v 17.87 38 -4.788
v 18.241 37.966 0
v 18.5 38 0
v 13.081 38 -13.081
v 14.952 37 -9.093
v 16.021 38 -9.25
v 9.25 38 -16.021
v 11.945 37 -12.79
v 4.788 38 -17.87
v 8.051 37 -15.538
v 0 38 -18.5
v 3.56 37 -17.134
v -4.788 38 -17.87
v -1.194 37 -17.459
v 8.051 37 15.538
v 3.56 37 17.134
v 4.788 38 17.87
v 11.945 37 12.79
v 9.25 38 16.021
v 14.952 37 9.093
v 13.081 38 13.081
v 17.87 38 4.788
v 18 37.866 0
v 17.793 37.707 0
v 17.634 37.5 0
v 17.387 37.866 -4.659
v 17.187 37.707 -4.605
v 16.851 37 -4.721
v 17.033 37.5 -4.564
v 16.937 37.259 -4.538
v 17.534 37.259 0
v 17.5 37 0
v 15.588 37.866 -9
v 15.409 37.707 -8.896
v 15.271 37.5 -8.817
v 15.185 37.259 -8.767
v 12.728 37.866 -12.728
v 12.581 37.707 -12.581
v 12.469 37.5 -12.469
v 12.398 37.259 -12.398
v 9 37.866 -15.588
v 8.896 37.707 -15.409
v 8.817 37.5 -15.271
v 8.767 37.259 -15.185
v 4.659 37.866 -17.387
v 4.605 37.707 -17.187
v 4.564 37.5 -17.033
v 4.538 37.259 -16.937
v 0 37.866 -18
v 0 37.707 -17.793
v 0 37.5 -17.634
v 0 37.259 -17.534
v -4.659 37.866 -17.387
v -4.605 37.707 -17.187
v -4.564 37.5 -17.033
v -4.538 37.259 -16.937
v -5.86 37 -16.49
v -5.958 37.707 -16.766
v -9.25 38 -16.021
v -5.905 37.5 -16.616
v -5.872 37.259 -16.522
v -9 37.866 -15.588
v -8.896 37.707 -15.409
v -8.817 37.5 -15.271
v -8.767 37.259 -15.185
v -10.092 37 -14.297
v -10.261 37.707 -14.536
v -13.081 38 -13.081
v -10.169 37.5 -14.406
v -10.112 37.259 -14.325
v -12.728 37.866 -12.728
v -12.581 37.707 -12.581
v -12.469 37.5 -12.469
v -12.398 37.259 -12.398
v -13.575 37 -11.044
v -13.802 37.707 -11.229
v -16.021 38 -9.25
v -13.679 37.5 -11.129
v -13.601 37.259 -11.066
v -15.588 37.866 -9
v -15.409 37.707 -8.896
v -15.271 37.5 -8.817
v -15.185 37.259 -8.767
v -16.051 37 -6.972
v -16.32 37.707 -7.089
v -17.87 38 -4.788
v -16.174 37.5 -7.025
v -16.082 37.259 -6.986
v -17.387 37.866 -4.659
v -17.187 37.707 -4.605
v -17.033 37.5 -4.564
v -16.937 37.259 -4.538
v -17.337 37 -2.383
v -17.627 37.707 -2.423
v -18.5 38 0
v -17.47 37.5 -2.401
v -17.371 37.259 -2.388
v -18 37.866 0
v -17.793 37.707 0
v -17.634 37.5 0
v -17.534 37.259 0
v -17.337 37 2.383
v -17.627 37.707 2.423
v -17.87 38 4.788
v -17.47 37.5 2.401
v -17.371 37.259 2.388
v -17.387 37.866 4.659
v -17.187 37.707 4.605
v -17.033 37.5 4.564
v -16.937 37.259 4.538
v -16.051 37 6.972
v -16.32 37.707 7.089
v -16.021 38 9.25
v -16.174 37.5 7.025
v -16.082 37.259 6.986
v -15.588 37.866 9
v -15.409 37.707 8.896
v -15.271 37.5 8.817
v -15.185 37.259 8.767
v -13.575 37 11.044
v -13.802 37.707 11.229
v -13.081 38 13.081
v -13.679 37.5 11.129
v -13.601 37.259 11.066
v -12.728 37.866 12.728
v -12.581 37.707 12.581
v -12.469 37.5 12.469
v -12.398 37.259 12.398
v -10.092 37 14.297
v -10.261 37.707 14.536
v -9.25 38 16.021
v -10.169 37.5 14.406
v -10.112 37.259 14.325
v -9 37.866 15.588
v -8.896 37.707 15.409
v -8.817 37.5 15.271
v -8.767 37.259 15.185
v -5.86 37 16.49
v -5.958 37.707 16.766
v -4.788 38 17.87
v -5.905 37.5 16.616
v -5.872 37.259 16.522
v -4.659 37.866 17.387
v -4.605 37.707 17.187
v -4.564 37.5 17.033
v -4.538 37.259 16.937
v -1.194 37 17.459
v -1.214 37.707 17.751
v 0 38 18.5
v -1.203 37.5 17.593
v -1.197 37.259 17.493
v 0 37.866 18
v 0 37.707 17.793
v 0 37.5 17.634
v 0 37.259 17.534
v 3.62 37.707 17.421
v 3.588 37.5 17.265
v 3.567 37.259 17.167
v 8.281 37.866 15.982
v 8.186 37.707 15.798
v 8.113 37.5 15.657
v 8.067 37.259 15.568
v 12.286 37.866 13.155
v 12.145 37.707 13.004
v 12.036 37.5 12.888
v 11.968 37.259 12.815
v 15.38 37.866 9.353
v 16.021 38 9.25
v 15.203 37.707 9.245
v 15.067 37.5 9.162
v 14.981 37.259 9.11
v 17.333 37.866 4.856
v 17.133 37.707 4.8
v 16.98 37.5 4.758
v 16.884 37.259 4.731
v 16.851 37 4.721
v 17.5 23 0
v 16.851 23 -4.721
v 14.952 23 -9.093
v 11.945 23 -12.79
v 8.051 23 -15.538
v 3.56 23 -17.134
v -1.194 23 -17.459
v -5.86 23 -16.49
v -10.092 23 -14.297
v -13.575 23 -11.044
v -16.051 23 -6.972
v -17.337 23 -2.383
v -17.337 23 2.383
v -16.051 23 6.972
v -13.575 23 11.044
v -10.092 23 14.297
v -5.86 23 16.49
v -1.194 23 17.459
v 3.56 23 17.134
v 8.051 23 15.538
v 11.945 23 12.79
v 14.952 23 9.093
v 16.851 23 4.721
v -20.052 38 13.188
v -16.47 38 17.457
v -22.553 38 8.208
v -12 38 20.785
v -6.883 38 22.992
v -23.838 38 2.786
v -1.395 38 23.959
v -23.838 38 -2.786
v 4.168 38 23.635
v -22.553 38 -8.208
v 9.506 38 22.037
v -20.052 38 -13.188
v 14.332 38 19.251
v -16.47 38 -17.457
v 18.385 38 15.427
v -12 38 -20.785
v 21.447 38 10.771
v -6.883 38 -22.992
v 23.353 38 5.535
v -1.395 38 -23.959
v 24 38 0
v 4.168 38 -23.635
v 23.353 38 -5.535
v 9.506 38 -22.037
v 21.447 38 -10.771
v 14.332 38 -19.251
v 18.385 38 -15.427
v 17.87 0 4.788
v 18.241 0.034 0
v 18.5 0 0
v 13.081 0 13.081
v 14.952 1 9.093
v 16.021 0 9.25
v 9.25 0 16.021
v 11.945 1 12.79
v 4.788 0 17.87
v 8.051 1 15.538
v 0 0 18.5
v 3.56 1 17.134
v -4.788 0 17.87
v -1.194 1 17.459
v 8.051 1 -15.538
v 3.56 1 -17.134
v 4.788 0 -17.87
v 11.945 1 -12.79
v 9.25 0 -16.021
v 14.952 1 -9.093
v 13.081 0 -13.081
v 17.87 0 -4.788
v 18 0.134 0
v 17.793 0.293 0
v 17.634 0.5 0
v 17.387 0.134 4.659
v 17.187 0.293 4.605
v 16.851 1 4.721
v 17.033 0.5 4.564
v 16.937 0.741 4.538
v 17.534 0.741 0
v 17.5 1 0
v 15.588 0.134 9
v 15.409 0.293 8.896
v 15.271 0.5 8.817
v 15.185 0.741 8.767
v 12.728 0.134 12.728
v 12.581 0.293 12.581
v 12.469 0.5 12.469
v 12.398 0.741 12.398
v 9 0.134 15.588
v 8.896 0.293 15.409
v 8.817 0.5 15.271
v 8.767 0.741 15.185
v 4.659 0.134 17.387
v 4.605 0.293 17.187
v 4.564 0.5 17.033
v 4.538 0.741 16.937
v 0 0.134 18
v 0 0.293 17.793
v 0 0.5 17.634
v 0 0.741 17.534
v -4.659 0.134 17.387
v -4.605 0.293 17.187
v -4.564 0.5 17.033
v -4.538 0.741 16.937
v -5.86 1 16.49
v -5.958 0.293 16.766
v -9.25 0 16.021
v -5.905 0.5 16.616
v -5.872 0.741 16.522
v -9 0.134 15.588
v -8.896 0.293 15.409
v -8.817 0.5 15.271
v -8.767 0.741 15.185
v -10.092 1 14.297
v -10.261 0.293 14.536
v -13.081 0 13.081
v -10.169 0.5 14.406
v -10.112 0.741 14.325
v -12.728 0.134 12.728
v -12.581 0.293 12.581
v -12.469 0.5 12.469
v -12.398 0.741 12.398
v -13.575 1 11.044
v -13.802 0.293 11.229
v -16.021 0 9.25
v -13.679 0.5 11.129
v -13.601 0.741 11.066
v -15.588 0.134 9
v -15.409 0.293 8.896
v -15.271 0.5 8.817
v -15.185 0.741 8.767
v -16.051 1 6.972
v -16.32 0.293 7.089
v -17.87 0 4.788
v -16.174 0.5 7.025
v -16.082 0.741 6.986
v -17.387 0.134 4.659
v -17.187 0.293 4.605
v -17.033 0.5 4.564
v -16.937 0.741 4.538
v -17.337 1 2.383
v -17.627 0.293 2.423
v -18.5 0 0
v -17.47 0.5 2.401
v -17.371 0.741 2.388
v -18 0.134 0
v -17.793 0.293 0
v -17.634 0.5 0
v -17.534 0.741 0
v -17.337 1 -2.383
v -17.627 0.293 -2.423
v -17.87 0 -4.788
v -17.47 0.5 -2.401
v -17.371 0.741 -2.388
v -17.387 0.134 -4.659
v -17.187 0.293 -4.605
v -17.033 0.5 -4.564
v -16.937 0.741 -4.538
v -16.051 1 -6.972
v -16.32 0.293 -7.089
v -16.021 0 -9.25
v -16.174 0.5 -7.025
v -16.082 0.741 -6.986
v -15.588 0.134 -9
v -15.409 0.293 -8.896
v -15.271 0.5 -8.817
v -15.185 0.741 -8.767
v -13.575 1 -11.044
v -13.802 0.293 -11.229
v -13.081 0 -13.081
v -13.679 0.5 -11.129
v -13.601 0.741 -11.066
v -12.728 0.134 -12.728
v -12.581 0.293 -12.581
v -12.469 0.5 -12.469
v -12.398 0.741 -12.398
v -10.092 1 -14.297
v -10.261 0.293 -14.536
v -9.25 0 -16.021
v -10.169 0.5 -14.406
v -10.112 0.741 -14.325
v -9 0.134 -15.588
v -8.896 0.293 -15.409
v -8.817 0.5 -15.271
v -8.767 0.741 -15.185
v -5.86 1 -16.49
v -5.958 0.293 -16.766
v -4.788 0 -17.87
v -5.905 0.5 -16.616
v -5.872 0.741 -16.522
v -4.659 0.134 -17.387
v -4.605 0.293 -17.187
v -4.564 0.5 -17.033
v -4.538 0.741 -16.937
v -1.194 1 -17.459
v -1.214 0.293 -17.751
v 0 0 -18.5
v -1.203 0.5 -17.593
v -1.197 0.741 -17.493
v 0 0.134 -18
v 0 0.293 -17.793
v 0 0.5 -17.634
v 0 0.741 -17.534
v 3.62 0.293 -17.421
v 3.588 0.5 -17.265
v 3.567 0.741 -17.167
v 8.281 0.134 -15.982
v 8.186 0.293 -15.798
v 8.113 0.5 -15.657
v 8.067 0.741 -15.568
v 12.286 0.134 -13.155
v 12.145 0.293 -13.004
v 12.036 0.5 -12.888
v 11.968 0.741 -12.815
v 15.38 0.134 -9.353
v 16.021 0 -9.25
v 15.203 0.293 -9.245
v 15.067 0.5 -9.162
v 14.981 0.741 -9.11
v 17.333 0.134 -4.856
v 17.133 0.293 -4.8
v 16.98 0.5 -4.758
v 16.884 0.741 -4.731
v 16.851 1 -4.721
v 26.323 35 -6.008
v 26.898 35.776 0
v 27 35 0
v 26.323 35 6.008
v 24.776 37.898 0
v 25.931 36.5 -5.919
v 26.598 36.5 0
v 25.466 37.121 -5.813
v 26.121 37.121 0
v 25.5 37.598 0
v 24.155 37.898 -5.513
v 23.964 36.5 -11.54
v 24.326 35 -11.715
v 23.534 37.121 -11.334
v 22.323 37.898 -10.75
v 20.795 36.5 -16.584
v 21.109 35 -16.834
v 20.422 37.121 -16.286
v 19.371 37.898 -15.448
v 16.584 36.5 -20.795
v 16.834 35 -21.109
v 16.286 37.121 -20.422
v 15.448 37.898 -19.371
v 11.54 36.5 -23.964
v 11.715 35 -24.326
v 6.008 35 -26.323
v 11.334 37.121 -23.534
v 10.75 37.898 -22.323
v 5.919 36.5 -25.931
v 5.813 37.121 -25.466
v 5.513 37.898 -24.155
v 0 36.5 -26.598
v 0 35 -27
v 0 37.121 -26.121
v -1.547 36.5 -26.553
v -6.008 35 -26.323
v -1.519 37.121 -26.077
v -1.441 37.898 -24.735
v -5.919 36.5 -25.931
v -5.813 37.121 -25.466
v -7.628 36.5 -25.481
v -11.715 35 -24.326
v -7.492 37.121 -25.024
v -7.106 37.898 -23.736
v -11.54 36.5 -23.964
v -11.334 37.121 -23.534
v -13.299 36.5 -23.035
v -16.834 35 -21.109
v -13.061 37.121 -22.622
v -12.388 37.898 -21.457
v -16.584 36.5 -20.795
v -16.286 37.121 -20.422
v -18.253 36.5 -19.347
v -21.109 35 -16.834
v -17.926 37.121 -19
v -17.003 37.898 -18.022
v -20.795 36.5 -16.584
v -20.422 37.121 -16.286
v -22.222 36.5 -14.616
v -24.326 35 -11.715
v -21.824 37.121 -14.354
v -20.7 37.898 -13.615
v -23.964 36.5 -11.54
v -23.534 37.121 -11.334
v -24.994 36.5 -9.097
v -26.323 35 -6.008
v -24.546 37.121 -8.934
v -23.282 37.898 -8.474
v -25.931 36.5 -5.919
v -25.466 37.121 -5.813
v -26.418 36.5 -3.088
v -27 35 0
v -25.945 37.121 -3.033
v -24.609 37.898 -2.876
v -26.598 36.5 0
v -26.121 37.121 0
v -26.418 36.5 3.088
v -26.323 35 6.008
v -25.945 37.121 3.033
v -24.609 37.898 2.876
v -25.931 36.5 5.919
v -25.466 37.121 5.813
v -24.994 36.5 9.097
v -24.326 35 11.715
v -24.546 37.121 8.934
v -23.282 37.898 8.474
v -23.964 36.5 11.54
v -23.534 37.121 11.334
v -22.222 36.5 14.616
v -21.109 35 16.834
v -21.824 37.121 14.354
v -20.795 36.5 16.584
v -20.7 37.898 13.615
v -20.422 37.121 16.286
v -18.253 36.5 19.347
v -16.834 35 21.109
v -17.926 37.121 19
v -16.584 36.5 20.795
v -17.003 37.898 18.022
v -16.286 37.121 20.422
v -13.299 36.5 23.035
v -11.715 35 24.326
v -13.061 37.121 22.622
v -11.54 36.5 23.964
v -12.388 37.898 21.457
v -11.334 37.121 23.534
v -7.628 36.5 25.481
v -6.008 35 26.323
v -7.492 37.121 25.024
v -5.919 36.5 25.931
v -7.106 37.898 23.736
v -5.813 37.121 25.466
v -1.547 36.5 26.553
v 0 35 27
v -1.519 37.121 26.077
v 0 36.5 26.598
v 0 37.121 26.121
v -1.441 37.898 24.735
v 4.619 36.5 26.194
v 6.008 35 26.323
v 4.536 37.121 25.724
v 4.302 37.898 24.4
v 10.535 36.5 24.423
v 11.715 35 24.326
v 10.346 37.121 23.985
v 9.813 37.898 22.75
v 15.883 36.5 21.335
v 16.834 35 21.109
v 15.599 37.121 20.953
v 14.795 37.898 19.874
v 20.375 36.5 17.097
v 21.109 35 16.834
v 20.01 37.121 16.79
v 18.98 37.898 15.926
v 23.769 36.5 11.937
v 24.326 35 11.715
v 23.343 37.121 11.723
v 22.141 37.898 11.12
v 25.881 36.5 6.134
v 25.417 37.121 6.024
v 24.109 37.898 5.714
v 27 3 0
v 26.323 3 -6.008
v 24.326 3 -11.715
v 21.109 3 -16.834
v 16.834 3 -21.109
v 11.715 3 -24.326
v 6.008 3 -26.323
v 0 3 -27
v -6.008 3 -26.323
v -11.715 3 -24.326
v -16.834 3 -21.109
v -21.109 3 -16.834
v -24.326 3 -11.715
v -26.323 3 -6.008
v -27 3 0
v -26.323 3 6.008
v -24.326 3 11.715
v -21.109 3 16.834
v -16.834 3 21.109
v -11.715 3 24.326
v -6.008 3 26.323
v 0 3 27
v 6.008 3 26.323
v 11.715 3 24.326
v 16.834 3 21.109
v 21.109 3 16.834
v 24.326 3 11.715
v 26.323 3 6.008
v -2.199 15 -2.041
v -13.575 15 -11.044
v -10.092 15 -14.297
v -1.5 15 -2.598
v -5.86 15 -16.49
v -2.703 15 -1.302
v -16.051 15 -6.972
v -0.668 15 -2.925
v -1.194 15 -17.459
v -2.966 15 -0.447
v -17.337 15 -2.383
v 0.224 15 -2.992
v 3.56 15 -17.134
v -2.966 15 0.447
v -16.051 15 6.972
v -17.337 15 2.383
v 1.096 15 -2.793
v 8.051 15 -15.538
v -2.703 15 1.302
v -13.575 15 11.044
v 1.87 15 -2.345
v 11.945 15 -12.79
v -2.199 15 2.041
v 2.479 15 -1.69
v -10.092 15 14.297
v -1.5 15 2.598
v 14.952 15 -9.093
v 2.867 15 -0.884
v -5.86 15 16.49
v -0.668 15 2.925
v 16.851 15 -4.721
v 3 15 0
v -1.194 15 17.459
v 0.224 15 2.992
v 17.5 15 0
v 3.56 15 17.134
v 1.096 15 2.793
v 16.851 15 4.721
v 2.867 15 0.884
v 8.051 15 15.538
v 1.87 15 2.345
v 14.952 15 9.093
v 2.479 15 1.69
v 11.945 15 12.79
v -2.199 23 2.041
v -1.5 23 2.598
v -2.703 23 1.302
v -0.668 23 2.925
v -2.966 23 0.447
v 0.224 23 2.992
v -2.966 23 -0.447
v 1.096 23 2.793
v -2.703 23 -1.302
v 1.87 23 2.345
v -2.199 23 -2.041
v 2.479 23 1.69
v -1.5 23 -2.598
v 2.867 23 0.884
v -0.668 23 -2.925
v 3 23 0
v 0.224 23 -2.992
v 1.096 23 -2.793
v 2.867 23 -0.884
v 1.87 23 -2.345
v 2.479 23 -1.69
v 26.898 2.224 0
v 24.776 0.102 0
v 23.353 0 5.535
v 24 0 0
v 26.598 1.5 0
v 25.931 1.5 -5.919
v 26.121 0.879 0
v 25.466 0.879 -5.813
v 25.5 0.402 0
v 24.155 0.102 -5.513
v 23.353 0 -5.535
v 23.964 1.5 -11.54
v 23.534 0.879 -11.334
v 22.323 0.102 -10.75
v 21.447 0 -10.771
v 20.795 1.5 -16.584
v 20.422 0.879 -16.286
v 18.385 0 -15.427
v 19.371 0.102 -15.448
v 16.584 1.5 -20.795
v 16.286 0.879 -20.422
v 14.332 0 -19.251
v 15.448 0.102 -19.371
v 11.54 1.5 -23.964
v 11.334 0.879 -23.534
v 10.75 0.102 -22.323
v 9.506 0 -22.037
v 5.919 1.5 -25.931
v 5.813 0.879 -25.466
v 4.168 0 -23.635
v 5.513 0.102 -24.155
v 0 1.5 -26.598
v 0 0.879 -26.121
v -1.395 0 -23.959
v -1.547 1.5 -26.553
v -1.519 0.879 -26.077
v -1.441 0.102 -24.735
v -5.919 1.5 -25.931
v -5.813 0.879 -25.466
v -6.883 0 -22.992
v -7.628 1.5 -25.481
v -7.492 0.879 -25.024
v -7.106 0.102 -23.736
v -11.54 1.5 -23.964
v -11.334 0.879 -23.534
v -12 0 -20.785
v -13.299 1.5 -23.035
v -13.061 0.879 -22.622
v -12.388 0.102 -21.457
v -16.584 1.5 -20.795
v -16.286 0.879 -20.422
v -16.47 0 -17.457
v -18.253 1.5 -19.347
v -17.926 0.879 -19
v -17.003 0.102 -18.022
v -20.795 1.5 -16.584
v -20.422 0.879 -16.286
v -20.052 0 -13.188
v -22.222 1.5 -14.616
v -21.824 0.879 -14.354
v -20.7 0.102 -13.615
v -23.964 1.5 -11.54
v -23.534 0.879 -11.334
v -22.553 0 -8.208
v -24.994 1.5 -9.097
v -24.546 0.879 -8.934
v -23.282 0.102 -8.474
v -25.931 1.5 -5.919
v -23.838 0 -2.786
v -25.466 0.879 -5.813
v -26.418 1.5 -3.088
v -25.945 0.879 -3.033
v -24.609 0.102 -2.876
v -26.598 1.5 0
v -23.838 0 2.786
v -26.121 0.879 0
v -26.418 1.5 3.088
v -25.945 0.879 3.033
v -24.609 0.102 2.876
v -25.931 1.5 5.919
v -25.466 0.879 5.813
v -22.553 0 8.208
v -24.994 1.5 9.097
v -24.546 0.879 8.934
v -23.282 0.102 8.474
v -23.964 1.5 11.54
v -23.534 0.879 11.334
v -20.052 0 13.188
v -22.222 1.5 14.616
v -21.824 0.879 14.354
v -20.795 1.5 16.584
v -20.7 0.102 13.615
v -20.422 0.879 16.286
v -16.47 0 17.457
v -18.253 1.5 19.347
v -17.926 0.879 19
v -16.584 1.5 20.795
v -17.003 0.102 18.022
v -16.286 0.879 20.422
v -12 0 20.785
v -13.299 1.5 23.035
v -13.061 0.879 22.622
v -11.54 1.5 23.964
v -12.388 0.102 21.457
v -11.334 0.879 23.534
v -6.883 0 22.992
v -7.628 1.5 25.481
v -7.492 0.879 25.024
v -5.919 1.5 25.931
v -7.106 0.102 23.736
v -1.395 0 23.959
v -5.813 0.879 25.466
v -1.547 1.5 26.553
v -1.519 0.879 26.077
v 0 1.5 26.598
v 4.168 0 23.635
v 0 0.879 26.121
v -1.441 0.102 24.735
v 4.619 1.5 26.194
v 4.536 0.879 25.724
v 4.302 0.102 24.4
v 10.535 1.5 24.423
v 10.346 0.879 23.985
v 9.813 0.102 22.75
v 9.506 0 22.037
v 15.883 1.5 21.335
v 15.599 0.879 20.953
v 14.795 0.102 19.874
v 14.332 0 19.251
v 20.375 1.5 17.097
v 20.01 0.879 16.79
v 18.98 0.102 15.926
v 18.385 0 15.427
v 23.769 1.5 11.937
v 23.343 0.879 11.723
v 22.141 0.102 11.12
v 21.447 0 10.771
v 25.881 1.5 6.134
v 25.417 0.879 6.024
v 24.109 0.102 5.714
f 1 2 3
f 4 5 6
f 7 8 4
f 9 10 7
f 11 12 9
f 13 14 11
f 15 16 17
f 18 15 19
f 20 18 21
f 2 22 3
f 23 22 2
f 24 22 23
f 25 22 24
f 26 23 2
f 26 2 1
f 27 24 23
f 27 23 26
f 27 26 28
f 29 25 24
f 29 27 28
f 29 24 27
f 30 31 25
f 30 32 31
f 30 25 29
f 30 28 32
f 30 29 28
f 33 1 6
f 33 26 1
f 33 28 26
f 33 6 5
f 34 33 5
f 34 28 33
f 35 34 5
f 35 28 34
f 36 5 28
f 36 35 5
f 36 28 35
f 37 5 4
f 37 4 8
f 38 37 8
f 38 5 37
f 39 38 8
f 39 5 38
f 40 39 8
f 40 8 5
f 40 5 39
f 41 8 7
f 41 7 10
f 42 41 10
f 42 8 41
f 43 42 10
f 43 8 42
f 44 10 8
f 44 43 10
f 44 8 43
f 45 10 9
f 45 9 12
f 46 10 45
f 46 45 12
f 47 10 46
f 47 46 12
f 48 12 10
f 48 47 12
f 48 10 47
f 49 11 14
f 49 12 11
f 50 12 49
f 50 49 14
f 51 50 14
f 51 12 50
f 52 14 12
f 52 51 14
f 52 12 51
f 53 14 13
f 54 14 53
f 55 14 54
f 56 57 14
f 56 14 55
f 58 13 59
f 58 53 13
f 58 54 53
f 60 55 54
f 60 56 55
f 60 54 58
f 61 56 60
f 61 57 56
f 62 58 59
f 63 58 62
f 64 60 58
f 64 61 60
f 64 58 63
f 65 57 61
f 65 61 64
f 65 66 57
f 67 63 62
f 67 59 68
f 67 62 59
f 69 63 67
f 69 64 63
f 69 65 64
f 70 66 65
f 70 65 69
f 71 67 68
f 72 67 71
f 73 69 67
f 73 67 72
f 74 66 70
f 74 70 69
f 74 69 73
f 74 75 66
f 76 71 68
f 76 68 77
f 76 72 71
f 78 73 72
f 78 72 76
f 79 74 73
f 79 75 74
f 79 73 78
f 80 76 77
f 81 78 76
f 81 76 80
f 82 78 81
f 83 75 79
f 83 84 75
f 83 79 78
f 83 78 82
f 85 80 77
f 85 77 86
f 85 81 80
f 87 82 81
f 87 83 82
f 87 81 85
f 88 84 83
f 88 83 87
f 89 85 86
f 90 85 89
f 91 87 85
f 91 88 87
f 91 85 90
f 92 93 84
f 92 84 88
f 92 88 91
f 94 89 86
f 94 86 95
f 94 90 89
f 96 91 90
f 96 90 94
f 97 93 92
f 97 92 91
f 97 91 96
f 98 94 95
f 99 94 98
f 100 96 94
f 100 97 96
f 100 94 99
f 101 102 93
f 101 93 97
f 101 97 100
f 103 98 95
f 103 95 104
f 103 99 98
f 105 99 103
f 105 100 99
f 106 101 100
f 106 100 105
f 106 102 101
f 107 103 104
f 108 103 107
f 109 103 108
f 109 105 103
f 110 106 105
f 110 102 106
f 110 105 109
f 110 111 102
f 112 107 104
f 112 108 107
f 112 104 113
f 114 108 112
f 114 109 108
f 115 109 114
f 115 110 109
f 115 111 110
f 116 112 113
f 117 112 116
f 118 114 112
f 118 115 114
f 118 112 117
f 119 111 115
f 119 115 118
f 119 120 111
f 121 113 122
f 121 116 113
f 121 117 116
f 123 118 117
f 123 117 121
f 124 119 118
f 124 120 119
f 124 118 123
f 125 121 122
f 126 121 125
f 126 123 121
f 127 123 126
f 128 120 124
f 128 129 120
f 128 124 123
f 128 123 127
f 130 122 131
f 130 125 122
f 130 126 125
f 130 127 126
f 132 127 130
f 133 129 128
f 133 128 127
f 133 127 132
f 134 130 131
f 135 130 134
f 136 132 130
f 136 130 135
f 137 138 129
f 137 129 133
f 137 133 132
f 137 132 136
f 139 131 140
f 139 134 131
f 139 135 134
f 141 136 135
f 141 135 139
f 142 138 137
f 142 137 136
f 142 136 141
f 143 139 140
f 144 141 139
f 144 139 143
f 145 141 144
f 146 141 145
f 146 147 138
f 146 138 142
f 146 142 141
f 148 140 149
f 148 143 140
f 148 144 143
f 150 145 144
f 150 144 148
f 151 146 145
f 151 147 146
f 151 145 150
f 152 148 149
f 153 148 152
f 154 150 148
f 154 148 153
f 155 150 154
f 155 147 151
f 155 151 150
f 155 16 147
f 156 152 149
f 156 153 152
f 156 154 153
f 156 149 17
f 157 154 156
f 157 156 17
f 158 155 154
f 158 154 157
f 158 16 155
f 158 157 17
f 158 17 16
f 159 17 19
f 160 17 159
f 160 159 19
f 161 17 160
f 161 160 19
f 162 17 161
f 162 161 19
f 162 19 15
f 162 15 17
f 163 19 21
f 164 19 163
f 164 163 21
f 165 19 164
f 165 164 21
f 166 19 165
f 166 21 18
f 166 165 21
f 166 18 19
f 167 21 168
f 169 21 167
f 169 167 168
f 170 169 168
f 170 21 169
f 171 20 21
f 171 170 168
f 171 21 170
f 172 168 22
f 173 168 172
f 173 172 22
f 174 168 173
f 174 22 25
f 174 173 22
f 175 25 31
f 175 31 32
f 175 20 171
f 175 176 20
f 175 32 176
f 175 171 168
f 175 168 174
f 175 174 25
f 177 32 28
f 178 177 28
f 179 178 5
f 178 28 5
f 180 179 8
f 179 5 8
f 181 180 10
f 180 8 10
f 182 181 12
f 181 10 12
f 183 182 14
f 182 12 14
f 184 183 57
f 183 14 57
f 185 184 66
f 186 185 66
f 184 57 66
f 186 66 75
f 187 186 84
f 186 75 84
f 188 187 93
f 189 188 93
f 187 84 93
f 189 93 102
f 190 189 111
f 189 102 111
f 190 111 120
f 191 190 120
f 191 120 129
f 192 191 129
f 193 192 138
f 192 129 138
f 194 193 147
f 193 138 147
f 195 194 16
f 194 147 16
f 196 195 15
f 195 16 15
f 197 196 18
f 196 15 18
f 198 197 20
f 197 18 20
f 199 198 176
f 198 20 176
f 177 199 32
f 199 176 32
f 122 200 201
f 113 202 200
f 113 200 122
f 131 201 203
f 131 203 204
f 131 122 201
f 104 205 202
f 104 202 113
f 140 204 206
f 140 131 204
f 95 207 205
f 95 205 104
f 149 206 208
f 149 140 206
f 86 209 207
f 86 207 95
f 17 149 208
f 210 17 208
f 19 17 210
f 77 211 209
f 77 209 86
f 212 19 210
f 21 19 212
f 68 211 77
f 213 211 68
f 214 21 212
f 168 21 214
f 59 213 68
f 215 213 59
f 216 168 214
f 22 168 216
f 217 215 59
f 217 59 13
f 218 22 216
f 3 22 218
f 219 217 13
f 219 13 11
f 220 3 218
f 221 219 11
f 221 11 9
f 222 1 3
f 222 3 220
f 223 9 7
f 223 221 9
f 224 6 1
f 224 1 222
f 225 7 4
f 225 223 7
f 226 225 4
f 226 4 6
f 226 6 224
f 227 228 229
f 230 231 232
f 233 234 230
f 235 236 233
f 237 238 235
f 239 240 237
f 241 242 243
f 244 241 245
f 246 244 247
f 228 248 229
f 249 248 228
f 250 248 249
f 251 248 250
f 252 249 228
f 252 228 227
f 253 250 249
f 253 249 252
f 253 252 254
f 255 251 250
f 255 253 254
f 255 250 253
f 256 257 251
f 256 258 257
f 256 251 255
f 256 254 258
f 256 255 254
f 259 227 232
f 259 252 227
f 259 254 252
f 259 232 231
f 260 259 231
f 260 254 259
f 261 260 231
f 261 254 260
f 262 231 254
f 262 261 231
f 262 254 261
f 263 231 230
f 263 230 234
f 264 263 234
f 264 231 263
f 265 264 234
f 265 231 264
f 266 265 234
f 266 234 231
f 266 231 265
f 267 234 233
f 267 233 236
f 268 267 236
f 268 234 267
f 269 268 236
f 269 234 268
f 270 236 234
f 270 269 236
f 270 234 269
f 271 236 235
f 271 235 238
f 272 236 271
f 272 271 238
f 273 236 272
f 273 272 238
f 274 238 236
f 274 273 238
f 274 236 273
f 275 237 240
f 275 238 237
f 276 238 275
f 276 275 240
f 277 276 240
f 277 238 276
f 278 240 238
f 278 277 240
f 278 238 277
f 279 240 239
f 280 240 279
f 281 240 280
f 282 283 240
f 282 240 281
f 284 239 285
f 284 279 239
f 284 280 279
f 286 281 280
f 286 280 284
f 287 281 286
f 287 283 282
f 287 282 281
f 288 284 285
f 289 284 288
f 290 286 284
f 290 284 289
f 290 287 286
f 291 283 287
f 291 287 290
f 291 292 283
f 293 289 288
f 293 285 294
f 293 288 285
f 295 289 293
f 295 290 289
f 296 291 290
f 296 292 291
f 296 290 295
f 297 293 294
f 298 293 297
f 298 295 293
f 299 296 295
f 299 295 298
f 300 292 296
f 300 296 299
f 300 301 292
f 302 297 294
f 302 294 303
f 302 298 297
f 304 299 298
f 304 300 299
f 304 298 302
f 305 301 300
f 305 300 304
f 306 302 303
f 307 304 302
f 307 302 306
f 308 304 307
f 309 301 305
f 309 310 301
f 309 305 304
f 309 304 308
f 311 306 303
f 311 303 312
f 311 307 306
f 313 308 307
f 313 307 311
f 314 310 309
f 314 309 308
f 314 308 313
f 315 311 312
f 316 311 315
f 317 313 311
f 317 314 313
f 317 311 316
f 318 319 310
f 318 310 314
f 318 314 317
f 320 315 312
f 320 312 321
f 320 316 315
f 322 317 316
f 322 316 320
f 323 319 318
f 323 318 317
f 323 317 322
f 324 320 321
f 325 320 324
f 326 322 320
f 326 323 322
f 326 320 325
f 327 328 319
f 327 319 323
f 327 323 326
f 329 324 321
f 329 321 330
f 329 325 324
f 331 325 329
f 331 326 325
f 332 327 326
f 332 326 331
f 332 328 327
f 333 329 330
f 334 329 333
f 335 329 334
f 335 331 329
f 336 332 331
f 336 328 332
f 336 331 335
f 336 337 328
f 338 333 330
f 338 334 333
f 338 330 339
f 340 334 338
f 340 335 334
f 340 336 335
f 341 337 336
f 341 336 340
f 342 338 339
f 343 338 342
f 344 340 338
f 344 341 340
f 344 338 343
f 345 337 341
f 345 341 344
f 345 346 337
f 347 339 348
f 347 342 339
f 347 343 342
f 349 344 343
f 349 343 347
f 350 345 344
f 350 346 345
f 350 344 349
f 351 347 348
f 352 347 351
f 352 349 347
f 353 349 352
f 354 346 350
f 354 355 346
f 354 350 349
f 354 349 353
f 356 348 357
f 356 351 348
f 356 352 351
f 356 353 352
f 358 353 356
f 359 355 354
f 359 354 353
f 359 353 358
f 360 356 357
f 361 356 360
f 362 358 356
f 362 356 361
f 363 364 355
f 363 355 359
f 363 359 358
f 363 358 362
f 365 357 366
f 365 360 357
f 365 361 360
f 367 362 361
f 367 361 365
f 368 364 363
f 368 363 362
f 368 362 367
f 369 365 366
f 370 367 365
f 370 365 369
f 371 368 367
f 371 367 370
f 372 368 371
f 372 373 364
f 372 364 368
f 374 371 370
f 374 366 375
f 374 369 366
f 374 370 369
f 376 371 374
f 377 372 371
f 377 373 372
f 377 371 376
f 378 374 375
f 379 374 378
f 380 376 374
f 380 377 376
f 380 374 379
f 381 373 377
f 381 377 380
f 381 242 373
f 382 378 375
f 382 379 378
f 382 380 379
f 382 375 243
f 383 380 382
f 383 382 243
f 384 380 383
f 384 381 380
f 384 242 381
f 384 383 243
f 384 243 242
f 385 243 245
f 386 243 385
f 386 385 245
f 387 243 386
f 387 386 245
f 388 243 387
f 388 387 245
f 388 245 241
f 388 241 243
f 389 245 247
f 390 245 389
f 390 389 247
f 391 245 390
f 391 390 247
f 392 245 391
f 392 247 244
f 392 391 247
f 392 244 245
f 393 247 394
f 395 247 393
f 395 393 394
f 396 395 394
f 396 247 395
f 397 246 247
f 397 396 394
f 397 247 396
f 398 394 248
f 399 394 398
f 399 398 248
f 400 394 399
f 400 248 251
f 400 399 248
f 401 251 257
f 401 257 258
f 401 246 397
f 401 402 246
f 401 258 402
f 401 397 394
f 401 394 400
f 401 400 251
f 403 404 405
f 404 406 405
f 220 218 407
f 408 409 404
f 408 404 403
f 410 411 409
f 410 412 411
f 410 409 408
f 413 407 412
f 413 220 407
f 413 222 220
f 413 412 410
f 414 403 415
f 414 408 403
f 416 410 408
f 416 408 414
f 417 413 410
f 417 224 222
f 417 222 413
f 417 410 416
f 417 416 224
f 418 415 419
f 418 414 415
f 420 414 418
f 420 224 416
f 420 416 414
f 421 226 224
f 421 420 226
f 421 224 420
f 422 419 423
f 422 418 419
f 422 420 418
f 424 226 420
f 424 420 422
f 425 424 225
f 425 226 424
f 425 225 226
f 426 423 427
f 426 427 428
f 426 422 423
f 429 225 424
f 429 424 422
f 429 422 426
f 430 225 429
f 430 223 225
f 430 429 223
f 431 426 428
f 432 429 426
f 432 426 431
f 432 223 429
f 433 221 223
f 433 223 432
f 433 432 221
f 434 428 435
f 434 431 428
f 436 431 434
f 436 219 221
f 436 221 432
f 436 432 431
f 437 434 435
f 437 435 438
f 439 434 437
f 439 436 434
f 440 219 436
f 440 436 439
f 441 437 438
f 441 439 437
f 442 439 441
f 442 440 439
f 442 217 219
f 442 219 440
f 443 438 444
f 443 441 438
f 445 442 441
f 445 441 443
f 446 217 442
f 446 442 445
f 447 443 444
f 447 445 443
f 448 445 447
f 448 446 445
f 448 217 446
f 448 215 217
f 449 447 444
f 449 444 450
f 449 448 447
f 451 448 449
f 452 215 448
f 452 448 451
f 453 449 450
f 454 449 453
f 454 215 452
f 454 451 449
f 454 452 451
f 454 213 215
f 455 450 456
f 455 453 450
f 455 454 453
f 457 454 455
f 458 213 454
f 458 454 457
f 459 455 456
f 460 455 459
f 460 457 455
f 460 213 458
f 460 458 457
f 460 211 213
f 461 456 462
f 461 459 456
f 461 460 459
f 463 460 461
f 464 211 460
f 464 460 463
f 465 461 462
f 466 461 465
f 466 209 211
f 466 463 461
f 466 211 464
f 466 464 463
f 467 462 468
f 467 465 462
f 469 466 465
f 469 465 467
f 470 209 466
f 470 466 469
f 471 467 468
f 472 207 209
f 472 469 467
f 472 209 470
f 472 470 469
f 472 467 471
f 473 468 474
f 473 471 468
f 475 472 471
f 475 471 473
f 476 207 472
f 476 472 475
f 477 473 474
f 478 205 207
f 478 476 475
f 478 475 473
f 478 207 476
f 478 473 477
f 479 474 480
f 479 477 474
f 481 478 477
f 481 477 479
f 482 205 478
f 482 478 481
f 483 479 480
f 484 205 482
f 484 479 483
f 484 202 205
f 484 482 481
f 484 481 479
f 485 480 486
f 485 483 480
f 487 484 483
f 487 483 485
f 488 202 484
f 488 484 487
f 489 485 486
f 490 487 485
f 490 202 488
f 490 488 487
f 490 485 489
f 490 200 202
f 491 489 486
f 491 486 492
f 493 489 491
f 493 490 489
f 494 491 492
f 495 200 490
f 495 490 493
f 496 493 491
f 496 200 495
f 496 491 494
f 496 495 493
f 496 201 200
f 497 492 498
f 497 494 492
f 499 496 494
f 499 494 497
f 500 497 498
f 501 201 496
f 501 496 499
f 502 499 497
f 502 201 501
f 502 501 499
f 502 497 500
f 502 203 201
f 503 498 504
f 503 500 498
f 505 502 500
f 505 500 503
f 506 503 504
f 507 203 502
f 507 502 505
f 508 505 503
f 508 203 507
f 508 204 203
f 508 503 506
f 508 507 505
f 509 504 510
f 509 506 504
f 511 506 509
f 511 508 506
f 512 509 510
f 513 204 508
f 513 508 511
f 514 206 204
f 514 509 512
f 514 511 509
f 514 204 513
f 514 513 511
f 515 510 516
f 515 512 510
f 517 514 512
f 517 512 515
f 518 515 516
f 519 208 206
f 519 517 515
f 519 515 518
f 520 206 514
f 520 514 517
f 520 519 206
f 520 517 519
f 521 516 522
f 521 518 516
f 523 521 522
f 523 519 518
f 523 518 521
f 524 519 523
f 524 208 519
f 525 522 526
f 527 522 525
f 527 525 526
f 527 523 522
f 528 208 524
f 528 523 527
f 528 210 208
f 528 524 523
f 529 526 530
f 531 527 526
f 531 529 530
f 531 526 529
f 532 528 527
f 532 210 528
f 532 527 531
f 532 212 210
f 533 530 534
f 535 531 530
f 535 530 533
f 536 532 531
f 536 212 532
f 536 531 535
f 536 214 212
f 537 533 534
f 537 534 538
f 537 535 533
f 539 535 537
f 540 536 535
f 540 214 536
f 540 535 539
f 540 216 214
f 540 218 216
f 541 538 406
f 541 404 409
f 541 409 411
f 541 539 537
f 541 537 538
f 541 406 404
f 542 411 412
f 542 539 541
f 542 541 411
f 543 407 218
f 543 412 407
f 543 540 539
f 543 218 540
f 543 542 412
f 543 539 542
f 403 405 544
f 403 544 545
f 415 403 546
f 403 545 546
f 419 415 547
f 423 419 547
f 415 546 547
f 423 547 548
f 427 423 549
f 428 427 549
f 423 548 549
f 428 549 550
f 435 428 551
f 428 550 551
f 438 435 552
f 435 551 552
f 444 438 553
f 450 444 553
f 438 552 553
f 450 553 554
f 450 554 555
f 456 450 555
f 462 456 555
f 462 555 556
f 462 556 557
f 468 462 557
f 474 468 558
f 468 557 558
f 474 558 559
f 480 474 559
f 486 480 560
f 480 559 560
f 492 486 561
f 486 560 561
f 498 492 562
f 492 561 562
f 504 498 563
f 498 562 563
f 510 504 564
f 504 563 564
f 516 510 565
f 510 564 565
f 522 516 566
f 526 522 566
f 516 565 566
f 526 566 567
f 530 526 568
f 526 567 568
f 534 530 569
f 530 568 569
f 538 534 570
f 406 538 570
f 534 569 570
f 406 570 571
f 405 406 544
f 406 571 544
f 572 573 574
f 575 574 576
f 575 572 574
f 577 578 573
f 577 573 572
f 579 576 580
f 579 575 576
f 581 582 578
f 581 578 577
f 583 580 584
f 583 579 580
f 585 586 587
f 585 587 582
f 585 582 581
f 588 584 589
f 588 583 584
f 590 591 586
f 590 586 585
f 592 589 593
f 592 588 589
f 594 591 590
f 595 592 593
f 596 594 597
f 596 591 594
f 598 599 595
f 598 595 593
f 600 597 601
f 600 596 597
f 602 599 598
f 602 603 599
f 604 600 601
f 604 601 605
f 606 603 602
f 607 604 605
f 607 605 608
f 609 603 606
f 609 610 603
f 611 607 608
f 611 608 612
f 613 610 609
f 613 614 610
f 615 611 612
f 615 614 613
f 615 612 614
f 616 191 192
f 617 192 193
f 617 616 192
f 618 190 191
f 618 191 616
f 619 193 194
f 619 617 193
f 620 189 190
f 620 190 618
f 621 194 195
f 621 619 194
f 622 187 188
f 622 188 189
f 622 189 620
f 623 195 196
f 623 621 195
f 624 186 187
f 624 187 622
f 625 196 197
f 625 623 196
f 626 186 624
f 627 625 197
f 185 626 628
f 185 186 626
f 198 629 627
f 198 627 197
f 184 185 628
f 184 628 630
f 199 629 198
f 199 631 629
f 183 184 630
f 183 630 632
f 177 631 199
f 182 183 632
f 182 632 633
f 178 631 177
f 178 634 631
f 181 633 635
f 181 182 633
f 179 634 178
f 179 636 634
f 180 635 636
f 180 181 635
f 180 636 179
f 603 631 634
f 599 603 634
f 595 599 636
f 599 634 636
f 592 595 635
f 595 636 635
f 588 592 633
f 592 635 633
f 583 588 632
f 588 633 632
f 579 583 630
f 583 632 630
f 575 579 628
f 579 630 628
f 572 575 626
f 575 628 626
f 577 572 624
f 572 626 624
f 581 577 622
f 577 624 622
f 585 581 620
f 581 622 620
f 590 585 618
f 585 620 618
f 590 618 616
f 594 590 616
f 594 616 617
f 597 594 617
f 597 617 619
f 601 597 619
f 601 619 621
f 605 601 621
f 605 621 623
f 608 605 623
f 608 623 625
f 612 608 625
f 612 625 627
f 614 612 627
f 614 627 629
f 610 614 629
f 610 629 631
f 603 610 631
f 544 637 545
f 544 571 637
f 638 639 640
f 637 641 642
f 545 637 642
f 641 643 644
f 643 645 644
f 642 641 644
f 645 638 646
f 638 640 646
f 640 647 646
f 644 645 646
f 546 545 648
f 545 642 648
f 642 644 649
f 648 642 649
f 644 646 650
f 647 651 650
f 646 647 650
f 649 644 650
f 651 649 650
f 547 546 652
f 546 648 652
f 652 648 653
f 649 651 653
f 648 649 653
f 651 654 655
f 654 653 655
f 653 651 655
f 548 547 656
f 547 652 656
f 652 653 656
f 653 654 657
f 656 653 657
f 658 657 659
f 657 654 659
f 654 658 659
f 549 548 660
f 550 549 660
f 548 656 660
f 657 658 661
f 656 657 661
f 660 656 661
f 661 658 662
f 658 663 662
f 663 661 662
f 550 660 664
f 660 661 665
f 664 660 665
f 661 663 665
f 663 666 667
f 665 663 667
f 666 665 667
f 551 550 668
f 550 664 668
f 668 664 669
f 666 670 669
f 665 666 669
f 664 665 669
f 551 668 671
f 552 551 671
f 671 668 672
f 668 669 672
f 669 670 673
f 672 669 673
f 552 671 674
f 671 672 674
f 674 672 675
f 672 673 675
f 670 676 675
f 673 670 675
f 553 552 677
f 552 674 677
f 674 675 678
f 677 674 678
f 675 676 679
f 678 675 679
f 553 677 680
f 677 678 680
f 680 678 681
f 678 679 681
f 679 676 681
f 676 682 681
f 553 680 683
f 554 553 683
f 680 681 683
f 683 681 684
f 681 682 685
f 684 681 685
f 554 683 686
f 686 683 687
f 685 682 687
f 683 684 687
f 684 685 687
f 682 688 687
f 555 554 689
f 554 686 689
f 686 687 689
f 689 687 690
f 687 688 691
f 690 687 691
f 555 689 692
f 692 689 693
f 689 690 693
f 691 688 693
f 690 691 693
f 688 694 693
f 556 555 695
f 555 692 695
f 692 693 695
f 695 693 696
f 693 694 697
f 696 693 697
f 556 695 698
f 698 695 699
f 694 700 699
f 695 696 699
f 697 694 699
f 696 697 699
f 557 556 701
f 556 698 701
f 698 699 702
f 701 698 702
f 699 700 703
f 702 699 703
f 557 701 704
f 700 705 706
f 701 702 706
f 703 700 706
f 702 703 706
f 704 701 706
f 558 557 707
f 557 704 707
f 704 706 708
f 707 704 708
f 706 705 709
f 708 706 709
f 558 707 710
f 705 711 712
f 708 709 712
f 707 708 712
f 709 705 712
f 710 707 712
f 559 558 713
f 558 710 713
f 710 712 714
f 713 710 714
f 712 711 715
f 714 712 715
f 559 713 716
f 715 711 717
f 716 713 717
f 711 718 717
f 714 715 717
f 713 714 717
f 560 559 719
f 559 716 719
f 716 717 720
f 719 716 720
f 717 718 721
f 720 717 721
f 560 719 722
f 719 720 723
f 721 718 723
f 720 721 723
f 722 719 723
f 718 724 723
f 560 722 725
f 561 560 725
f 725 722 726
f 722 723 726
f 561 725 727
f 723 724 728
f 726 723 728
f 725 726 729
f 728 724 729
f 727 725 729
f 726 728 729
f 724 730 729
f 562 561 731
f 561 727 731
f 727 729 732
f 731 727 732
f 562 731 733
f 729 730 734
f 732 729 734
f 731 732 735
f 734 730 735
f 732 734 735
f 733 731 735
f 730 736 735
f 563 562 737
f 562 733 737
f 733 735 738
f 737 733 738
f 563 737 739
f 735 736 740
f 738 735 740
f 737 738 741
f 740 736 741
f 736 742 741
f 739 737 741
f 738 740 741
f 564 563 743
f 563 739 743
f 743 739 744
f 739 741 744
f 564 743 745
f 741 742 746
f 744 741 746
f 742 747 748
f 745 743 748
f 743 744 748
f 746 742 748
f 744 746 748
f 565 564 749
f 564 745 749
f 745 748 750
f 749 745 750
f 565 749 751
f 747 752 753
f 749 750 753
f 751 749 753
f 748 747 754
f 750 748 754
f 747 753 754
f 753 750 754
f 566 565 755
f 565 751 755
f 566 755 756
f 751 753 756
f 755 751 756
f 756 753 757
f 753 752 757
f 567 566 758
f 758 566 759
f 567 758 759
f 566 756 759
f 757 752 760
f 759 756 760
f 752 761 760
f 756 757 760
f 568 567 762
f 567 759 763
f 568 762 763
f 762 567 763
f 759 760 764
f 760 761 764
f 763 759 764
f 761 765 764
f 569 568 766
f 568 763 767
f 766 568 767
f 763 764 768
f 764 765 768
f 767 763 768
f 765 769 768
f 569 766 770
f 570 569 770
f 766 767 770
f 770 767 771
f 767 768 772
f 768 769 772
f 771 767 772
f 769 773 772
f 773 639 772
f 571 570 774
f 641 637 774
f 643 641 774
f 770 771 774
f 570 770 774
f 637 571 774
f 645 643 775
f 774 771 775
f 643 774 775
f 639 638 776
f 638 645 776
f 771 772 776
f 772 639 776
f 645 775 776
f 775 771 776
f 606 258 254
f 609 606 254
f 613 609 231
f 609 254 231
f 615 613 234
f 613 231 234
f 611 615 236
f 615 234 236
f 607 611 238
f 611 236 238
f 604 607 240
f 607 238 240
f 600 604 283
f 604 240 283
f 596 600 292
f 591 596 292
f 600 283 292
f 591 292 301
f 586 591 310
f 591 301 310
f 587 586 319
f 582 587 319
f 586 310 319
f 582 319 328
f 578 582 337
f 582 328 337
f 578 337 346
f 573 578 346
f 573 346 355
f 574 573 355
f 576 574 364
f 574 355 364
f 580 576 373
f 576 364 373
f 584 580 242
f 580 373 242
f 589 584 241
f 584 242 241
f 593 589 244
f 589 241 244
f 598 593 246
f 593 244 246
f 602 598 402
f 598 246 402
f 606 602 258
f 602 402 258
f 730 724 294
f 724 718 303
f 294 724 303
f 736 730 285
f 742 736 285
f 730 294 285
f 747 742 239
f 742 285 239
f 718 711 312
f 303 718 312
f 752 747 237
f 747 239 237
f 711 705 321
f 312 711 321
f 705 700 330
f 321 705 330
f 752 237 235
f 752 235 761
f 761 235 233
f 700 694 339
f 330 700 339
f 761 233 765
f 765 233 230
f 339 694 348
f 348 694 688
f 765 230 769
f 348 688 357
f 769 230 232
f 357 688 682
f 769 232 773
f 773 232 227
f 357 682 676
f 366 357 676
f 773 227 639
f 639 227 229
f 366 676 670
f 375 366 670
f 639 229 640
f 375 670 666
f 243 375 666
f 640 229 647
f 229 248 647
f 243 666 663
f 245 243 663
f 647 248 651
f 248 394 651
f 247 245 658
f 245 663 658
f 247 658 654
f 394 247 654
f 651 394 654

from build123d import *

# Parameters (mm, degrees)
ESQUISSE1_R             = 27
BOSS_EXTRU_1_DEPTH      = 38
CONG_1_R                = 3
CONG_2_R                = 3
ESQUISSE2_R             = 17.5
ENL_V_MAT_EXTRU_1_DEPTH = 15
ESQUISSE3_R             = 17.5
ENL_V_MAT_EXTRU_2_DEPTH = 15
ESQUISSE4_R             = 3
ENL_V_MAT_EXTRU_3_DEPTH = 15
CONG_3_R                = 1
CONG_4_R                = 1


with BuildPart() as part:
    # Esquisse1 → Boss.-Extru.1 (new body)
    with BuildSketch(Plane(origin=(0, 0, 0), x_dir=(1, 0, 0), z_dir=(0, 1, 0))):
        Circle(ESQUISSE1_R)
    extrude(amount=BOSS_EXTRU_1_DEPTH)

    # Congé1
    cong_1_edges = [part.edges().sort_by_distance(p)[0] for p in [
        (-27, 38, 0),
    ]]
    fillet(cong_1_edges, radius=CONG_1_R)

    # Congé2
    cong_2_edges = [part.edges().sort_by_distance(p)[0] for p in [
        (-27, 0, 0),
    ]]
    fillet(cong_2_edges, radius=CONG_2_R)

    # Esquisse2 → Enlèv. mat.-Extru.1 (cut)
    with BuildSketch(Plane.XZ):
        Circle(ESQUISSE2_R)
    extrude(amount=-ENL_V_MAT_EXTRU_1_DEPTH, mode=Mode.SUBTRACT)

    # Esquisse3 → Enlèv. mat.-Extru.2 (cut)
    with BuildSketch(Plane(origin=(0, 38, 0), x_dir=(1, 0, 0), z_dir=(0, 1, 0))):
        Circle(ESQUISSE3_R)
    extrude(amount=-ENL_V_MAT_EXTRU_2_DEPTH, mode=Mode.SUBTRACT)

    # Esquisse4 → Enlèv. mat.-Extru.3 (cut)
    with BuildSketch(Plane(origin=(0, 23, 0), x_dir=(1, 0, 0), z_dir=(0, 1, 0))):
        Circle(ESQUISSE4_R)
    extrude(amount=-ENL_V_MAT_EXTRU_3_DEPTH, mode=Mode.SUBTRACT)

    # Congé3
    cong_3_edges = [part.edges().sort_by_distance(p)[0] for p in [
        (-17.5, 38, 0),
    ]]
    fillet(cong_3_edges, radius=CONG_3_R)

    # Congé4
    cong_4_edges = [part.edges().sort_by_distance(p)[0] for p in [
        (-17.5, 0, 0),
    ]]
    fillet(cong_4_edges, radius=CONG_4_R)


solid = part.part
